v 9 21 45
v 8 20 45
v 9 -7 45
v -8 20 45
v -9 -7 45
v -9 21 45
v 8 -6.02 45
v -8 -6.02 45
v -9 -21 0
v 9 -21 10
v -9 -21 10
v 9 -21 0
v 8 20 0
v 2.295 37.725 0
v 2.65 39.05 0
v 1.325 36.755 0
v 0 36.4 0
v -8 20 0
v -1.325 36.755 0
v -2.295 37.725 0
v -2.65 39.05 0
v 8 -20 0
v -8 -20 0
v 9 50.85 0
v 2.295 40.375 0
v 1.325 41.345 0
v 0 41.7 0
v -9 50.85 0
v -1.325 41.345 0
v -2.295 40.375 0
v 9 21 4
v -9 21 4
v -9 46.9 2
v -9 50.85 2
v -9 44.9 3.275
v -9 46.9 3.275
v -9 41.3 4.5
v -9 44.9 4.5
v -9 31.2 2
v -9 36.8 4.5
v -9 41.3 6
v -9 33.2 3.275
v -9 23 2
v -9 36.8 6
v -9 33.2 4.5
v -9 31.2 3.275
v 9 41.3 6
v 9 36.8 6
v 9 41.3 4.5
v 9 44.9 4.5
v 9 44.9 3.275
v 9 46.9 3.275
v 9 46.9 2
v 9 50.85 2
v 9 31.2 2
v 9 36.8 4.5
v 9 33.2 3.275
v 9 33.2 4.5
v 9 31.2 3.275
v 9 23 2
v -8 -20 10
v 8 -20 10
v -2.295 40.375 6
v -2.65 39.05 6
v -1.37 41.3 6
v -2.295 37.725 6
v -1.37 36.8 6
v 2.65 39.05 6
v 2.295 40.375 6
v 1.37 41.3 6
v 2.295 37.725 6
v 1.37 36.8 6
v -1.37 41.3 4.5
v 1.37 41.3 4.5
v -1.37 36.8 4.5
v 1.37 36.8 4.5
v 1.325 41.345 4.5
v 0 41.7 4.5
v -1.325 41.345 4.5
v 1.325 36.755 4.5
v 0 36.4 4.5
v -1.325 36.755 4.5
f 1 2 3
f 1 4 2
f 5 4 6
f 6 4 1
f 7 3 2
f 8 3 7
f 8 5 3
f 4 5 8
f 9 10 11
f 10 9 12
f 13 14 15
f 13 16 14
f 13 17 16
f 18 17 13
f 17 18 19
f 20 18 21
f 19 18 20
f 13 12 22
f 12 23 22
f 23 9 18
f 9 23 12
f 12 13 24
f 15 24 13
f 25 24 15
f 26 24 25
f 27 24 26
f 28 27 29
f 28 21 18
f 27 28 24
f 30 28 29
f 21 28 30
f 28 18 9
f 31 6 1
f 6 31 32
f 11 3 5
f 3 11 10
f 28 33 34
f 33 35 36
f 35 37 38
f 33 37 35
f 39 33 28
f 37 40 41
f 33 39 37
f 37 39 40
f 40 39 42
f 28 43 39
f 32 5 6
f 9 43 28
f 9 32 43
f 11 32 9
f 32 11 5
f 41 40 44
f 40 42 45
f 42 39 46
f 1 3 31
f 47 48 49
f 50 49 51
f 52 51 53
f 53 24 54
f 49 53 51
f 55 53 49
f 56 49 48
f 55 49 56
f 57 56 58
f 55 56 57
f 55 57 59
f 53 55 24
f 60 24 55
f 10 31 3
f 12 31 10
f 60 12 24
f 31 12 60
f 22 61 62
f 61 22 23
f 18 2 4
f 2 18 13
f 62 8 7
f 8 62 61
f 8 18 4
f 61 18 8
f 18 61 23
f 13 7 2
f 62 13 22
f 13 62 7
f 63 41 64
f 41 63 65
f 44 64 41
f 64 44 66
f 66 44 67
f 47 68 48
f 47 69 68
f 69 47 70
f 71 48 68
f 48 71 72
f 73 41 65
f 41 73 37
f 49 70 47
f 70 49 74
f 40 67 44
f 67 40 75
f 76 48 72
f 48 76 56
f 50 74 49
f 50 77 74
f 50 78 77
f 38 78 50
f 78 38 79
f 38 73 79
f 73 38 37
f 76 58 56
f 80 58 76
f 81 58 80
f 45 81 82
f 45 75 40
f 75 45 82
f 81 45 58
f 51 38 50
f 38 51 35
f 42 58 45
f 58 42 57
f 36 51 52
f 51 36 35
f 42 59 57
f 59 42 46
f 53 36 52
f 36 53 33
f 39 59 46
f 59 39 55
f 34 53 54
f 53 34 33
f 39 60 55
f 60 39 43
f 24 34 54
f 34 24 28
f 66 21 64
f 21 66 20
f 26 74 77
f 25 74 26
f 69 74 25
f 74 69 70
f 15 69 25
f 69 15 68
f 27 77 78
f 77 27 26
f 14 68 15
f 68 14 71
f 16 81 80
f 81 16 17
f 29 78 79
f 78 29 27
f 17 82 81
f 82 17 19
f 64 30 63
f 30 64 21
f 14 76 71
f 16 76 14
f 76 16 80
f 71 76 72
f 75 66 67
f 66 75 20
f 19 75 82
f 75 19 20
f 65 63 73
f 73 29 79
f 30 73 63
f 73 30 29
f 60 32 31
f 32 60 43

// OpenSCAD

h = 45;
w = 16;
l = 40;
t = 1.0;
o = 0.65;

c = 0.3;
b = 27.5+c*2;
s = 5;

difference()
{
	hull()
	{
		translate( [ 0, 0, 5 ] )
		cube( [ w+t*2, l+t*2, 10 ], center = true );
		translate( [ 0, (l*o+t*2)/4, h-5 ] )
		cube( [ w+t*2, l*o+t*2, 10 ], center = true );
	}
	hull()
	{
		translate( [ 0, 0, 4.9 ] )
		cube( [ w+t*0, l+t*0, 10.2 ], center = true );
		translate( [ 0, (l*o+t*2)/4, h-5 ] )
		cube( [ w+t*0, l*o+t*0, 10.1 ], center = true );
	}
}
 
difference()
{
	translate( [ 0, l/2+b/2+s, t+t ] )
	{
		translate( [ 0, 0, +1.5 ] )
			cube( [ w+t*2, 4.5, 5 ], center = true );

		translate( [ 0,0, 0.75 ] )
			cube( [ w+t*2, 12-c, 1+2.5 ], center = true );

		translate( [ 0,0, 0.15 ] )
			cube( [ w+t*2, 16-c, 1+1.25 ], center = true );

		translate( [ 0,-s/2-1, -t ] )
			cube( [ w+t*2, b+s-2-t/2, t*2 ], center = true );

	}
	translate( [ 0, l/2+b/2+s, 0 ] )
		cylinder( r = 2.65, h = 100, center = true, $fn = 12 );
}

	translate( [ 0, t+l/2, t*2 ] )
		intersection()
		{
		rotate( [ 0, 90, 0 ] ) 
			cylinder( r = t*2, h = w+t*2, center = true, $fn = 4 );
		translate( [ 0, 5, 0 ] )
			cube( [ 100, 10+t/2, 100 ], center = true );
		}
